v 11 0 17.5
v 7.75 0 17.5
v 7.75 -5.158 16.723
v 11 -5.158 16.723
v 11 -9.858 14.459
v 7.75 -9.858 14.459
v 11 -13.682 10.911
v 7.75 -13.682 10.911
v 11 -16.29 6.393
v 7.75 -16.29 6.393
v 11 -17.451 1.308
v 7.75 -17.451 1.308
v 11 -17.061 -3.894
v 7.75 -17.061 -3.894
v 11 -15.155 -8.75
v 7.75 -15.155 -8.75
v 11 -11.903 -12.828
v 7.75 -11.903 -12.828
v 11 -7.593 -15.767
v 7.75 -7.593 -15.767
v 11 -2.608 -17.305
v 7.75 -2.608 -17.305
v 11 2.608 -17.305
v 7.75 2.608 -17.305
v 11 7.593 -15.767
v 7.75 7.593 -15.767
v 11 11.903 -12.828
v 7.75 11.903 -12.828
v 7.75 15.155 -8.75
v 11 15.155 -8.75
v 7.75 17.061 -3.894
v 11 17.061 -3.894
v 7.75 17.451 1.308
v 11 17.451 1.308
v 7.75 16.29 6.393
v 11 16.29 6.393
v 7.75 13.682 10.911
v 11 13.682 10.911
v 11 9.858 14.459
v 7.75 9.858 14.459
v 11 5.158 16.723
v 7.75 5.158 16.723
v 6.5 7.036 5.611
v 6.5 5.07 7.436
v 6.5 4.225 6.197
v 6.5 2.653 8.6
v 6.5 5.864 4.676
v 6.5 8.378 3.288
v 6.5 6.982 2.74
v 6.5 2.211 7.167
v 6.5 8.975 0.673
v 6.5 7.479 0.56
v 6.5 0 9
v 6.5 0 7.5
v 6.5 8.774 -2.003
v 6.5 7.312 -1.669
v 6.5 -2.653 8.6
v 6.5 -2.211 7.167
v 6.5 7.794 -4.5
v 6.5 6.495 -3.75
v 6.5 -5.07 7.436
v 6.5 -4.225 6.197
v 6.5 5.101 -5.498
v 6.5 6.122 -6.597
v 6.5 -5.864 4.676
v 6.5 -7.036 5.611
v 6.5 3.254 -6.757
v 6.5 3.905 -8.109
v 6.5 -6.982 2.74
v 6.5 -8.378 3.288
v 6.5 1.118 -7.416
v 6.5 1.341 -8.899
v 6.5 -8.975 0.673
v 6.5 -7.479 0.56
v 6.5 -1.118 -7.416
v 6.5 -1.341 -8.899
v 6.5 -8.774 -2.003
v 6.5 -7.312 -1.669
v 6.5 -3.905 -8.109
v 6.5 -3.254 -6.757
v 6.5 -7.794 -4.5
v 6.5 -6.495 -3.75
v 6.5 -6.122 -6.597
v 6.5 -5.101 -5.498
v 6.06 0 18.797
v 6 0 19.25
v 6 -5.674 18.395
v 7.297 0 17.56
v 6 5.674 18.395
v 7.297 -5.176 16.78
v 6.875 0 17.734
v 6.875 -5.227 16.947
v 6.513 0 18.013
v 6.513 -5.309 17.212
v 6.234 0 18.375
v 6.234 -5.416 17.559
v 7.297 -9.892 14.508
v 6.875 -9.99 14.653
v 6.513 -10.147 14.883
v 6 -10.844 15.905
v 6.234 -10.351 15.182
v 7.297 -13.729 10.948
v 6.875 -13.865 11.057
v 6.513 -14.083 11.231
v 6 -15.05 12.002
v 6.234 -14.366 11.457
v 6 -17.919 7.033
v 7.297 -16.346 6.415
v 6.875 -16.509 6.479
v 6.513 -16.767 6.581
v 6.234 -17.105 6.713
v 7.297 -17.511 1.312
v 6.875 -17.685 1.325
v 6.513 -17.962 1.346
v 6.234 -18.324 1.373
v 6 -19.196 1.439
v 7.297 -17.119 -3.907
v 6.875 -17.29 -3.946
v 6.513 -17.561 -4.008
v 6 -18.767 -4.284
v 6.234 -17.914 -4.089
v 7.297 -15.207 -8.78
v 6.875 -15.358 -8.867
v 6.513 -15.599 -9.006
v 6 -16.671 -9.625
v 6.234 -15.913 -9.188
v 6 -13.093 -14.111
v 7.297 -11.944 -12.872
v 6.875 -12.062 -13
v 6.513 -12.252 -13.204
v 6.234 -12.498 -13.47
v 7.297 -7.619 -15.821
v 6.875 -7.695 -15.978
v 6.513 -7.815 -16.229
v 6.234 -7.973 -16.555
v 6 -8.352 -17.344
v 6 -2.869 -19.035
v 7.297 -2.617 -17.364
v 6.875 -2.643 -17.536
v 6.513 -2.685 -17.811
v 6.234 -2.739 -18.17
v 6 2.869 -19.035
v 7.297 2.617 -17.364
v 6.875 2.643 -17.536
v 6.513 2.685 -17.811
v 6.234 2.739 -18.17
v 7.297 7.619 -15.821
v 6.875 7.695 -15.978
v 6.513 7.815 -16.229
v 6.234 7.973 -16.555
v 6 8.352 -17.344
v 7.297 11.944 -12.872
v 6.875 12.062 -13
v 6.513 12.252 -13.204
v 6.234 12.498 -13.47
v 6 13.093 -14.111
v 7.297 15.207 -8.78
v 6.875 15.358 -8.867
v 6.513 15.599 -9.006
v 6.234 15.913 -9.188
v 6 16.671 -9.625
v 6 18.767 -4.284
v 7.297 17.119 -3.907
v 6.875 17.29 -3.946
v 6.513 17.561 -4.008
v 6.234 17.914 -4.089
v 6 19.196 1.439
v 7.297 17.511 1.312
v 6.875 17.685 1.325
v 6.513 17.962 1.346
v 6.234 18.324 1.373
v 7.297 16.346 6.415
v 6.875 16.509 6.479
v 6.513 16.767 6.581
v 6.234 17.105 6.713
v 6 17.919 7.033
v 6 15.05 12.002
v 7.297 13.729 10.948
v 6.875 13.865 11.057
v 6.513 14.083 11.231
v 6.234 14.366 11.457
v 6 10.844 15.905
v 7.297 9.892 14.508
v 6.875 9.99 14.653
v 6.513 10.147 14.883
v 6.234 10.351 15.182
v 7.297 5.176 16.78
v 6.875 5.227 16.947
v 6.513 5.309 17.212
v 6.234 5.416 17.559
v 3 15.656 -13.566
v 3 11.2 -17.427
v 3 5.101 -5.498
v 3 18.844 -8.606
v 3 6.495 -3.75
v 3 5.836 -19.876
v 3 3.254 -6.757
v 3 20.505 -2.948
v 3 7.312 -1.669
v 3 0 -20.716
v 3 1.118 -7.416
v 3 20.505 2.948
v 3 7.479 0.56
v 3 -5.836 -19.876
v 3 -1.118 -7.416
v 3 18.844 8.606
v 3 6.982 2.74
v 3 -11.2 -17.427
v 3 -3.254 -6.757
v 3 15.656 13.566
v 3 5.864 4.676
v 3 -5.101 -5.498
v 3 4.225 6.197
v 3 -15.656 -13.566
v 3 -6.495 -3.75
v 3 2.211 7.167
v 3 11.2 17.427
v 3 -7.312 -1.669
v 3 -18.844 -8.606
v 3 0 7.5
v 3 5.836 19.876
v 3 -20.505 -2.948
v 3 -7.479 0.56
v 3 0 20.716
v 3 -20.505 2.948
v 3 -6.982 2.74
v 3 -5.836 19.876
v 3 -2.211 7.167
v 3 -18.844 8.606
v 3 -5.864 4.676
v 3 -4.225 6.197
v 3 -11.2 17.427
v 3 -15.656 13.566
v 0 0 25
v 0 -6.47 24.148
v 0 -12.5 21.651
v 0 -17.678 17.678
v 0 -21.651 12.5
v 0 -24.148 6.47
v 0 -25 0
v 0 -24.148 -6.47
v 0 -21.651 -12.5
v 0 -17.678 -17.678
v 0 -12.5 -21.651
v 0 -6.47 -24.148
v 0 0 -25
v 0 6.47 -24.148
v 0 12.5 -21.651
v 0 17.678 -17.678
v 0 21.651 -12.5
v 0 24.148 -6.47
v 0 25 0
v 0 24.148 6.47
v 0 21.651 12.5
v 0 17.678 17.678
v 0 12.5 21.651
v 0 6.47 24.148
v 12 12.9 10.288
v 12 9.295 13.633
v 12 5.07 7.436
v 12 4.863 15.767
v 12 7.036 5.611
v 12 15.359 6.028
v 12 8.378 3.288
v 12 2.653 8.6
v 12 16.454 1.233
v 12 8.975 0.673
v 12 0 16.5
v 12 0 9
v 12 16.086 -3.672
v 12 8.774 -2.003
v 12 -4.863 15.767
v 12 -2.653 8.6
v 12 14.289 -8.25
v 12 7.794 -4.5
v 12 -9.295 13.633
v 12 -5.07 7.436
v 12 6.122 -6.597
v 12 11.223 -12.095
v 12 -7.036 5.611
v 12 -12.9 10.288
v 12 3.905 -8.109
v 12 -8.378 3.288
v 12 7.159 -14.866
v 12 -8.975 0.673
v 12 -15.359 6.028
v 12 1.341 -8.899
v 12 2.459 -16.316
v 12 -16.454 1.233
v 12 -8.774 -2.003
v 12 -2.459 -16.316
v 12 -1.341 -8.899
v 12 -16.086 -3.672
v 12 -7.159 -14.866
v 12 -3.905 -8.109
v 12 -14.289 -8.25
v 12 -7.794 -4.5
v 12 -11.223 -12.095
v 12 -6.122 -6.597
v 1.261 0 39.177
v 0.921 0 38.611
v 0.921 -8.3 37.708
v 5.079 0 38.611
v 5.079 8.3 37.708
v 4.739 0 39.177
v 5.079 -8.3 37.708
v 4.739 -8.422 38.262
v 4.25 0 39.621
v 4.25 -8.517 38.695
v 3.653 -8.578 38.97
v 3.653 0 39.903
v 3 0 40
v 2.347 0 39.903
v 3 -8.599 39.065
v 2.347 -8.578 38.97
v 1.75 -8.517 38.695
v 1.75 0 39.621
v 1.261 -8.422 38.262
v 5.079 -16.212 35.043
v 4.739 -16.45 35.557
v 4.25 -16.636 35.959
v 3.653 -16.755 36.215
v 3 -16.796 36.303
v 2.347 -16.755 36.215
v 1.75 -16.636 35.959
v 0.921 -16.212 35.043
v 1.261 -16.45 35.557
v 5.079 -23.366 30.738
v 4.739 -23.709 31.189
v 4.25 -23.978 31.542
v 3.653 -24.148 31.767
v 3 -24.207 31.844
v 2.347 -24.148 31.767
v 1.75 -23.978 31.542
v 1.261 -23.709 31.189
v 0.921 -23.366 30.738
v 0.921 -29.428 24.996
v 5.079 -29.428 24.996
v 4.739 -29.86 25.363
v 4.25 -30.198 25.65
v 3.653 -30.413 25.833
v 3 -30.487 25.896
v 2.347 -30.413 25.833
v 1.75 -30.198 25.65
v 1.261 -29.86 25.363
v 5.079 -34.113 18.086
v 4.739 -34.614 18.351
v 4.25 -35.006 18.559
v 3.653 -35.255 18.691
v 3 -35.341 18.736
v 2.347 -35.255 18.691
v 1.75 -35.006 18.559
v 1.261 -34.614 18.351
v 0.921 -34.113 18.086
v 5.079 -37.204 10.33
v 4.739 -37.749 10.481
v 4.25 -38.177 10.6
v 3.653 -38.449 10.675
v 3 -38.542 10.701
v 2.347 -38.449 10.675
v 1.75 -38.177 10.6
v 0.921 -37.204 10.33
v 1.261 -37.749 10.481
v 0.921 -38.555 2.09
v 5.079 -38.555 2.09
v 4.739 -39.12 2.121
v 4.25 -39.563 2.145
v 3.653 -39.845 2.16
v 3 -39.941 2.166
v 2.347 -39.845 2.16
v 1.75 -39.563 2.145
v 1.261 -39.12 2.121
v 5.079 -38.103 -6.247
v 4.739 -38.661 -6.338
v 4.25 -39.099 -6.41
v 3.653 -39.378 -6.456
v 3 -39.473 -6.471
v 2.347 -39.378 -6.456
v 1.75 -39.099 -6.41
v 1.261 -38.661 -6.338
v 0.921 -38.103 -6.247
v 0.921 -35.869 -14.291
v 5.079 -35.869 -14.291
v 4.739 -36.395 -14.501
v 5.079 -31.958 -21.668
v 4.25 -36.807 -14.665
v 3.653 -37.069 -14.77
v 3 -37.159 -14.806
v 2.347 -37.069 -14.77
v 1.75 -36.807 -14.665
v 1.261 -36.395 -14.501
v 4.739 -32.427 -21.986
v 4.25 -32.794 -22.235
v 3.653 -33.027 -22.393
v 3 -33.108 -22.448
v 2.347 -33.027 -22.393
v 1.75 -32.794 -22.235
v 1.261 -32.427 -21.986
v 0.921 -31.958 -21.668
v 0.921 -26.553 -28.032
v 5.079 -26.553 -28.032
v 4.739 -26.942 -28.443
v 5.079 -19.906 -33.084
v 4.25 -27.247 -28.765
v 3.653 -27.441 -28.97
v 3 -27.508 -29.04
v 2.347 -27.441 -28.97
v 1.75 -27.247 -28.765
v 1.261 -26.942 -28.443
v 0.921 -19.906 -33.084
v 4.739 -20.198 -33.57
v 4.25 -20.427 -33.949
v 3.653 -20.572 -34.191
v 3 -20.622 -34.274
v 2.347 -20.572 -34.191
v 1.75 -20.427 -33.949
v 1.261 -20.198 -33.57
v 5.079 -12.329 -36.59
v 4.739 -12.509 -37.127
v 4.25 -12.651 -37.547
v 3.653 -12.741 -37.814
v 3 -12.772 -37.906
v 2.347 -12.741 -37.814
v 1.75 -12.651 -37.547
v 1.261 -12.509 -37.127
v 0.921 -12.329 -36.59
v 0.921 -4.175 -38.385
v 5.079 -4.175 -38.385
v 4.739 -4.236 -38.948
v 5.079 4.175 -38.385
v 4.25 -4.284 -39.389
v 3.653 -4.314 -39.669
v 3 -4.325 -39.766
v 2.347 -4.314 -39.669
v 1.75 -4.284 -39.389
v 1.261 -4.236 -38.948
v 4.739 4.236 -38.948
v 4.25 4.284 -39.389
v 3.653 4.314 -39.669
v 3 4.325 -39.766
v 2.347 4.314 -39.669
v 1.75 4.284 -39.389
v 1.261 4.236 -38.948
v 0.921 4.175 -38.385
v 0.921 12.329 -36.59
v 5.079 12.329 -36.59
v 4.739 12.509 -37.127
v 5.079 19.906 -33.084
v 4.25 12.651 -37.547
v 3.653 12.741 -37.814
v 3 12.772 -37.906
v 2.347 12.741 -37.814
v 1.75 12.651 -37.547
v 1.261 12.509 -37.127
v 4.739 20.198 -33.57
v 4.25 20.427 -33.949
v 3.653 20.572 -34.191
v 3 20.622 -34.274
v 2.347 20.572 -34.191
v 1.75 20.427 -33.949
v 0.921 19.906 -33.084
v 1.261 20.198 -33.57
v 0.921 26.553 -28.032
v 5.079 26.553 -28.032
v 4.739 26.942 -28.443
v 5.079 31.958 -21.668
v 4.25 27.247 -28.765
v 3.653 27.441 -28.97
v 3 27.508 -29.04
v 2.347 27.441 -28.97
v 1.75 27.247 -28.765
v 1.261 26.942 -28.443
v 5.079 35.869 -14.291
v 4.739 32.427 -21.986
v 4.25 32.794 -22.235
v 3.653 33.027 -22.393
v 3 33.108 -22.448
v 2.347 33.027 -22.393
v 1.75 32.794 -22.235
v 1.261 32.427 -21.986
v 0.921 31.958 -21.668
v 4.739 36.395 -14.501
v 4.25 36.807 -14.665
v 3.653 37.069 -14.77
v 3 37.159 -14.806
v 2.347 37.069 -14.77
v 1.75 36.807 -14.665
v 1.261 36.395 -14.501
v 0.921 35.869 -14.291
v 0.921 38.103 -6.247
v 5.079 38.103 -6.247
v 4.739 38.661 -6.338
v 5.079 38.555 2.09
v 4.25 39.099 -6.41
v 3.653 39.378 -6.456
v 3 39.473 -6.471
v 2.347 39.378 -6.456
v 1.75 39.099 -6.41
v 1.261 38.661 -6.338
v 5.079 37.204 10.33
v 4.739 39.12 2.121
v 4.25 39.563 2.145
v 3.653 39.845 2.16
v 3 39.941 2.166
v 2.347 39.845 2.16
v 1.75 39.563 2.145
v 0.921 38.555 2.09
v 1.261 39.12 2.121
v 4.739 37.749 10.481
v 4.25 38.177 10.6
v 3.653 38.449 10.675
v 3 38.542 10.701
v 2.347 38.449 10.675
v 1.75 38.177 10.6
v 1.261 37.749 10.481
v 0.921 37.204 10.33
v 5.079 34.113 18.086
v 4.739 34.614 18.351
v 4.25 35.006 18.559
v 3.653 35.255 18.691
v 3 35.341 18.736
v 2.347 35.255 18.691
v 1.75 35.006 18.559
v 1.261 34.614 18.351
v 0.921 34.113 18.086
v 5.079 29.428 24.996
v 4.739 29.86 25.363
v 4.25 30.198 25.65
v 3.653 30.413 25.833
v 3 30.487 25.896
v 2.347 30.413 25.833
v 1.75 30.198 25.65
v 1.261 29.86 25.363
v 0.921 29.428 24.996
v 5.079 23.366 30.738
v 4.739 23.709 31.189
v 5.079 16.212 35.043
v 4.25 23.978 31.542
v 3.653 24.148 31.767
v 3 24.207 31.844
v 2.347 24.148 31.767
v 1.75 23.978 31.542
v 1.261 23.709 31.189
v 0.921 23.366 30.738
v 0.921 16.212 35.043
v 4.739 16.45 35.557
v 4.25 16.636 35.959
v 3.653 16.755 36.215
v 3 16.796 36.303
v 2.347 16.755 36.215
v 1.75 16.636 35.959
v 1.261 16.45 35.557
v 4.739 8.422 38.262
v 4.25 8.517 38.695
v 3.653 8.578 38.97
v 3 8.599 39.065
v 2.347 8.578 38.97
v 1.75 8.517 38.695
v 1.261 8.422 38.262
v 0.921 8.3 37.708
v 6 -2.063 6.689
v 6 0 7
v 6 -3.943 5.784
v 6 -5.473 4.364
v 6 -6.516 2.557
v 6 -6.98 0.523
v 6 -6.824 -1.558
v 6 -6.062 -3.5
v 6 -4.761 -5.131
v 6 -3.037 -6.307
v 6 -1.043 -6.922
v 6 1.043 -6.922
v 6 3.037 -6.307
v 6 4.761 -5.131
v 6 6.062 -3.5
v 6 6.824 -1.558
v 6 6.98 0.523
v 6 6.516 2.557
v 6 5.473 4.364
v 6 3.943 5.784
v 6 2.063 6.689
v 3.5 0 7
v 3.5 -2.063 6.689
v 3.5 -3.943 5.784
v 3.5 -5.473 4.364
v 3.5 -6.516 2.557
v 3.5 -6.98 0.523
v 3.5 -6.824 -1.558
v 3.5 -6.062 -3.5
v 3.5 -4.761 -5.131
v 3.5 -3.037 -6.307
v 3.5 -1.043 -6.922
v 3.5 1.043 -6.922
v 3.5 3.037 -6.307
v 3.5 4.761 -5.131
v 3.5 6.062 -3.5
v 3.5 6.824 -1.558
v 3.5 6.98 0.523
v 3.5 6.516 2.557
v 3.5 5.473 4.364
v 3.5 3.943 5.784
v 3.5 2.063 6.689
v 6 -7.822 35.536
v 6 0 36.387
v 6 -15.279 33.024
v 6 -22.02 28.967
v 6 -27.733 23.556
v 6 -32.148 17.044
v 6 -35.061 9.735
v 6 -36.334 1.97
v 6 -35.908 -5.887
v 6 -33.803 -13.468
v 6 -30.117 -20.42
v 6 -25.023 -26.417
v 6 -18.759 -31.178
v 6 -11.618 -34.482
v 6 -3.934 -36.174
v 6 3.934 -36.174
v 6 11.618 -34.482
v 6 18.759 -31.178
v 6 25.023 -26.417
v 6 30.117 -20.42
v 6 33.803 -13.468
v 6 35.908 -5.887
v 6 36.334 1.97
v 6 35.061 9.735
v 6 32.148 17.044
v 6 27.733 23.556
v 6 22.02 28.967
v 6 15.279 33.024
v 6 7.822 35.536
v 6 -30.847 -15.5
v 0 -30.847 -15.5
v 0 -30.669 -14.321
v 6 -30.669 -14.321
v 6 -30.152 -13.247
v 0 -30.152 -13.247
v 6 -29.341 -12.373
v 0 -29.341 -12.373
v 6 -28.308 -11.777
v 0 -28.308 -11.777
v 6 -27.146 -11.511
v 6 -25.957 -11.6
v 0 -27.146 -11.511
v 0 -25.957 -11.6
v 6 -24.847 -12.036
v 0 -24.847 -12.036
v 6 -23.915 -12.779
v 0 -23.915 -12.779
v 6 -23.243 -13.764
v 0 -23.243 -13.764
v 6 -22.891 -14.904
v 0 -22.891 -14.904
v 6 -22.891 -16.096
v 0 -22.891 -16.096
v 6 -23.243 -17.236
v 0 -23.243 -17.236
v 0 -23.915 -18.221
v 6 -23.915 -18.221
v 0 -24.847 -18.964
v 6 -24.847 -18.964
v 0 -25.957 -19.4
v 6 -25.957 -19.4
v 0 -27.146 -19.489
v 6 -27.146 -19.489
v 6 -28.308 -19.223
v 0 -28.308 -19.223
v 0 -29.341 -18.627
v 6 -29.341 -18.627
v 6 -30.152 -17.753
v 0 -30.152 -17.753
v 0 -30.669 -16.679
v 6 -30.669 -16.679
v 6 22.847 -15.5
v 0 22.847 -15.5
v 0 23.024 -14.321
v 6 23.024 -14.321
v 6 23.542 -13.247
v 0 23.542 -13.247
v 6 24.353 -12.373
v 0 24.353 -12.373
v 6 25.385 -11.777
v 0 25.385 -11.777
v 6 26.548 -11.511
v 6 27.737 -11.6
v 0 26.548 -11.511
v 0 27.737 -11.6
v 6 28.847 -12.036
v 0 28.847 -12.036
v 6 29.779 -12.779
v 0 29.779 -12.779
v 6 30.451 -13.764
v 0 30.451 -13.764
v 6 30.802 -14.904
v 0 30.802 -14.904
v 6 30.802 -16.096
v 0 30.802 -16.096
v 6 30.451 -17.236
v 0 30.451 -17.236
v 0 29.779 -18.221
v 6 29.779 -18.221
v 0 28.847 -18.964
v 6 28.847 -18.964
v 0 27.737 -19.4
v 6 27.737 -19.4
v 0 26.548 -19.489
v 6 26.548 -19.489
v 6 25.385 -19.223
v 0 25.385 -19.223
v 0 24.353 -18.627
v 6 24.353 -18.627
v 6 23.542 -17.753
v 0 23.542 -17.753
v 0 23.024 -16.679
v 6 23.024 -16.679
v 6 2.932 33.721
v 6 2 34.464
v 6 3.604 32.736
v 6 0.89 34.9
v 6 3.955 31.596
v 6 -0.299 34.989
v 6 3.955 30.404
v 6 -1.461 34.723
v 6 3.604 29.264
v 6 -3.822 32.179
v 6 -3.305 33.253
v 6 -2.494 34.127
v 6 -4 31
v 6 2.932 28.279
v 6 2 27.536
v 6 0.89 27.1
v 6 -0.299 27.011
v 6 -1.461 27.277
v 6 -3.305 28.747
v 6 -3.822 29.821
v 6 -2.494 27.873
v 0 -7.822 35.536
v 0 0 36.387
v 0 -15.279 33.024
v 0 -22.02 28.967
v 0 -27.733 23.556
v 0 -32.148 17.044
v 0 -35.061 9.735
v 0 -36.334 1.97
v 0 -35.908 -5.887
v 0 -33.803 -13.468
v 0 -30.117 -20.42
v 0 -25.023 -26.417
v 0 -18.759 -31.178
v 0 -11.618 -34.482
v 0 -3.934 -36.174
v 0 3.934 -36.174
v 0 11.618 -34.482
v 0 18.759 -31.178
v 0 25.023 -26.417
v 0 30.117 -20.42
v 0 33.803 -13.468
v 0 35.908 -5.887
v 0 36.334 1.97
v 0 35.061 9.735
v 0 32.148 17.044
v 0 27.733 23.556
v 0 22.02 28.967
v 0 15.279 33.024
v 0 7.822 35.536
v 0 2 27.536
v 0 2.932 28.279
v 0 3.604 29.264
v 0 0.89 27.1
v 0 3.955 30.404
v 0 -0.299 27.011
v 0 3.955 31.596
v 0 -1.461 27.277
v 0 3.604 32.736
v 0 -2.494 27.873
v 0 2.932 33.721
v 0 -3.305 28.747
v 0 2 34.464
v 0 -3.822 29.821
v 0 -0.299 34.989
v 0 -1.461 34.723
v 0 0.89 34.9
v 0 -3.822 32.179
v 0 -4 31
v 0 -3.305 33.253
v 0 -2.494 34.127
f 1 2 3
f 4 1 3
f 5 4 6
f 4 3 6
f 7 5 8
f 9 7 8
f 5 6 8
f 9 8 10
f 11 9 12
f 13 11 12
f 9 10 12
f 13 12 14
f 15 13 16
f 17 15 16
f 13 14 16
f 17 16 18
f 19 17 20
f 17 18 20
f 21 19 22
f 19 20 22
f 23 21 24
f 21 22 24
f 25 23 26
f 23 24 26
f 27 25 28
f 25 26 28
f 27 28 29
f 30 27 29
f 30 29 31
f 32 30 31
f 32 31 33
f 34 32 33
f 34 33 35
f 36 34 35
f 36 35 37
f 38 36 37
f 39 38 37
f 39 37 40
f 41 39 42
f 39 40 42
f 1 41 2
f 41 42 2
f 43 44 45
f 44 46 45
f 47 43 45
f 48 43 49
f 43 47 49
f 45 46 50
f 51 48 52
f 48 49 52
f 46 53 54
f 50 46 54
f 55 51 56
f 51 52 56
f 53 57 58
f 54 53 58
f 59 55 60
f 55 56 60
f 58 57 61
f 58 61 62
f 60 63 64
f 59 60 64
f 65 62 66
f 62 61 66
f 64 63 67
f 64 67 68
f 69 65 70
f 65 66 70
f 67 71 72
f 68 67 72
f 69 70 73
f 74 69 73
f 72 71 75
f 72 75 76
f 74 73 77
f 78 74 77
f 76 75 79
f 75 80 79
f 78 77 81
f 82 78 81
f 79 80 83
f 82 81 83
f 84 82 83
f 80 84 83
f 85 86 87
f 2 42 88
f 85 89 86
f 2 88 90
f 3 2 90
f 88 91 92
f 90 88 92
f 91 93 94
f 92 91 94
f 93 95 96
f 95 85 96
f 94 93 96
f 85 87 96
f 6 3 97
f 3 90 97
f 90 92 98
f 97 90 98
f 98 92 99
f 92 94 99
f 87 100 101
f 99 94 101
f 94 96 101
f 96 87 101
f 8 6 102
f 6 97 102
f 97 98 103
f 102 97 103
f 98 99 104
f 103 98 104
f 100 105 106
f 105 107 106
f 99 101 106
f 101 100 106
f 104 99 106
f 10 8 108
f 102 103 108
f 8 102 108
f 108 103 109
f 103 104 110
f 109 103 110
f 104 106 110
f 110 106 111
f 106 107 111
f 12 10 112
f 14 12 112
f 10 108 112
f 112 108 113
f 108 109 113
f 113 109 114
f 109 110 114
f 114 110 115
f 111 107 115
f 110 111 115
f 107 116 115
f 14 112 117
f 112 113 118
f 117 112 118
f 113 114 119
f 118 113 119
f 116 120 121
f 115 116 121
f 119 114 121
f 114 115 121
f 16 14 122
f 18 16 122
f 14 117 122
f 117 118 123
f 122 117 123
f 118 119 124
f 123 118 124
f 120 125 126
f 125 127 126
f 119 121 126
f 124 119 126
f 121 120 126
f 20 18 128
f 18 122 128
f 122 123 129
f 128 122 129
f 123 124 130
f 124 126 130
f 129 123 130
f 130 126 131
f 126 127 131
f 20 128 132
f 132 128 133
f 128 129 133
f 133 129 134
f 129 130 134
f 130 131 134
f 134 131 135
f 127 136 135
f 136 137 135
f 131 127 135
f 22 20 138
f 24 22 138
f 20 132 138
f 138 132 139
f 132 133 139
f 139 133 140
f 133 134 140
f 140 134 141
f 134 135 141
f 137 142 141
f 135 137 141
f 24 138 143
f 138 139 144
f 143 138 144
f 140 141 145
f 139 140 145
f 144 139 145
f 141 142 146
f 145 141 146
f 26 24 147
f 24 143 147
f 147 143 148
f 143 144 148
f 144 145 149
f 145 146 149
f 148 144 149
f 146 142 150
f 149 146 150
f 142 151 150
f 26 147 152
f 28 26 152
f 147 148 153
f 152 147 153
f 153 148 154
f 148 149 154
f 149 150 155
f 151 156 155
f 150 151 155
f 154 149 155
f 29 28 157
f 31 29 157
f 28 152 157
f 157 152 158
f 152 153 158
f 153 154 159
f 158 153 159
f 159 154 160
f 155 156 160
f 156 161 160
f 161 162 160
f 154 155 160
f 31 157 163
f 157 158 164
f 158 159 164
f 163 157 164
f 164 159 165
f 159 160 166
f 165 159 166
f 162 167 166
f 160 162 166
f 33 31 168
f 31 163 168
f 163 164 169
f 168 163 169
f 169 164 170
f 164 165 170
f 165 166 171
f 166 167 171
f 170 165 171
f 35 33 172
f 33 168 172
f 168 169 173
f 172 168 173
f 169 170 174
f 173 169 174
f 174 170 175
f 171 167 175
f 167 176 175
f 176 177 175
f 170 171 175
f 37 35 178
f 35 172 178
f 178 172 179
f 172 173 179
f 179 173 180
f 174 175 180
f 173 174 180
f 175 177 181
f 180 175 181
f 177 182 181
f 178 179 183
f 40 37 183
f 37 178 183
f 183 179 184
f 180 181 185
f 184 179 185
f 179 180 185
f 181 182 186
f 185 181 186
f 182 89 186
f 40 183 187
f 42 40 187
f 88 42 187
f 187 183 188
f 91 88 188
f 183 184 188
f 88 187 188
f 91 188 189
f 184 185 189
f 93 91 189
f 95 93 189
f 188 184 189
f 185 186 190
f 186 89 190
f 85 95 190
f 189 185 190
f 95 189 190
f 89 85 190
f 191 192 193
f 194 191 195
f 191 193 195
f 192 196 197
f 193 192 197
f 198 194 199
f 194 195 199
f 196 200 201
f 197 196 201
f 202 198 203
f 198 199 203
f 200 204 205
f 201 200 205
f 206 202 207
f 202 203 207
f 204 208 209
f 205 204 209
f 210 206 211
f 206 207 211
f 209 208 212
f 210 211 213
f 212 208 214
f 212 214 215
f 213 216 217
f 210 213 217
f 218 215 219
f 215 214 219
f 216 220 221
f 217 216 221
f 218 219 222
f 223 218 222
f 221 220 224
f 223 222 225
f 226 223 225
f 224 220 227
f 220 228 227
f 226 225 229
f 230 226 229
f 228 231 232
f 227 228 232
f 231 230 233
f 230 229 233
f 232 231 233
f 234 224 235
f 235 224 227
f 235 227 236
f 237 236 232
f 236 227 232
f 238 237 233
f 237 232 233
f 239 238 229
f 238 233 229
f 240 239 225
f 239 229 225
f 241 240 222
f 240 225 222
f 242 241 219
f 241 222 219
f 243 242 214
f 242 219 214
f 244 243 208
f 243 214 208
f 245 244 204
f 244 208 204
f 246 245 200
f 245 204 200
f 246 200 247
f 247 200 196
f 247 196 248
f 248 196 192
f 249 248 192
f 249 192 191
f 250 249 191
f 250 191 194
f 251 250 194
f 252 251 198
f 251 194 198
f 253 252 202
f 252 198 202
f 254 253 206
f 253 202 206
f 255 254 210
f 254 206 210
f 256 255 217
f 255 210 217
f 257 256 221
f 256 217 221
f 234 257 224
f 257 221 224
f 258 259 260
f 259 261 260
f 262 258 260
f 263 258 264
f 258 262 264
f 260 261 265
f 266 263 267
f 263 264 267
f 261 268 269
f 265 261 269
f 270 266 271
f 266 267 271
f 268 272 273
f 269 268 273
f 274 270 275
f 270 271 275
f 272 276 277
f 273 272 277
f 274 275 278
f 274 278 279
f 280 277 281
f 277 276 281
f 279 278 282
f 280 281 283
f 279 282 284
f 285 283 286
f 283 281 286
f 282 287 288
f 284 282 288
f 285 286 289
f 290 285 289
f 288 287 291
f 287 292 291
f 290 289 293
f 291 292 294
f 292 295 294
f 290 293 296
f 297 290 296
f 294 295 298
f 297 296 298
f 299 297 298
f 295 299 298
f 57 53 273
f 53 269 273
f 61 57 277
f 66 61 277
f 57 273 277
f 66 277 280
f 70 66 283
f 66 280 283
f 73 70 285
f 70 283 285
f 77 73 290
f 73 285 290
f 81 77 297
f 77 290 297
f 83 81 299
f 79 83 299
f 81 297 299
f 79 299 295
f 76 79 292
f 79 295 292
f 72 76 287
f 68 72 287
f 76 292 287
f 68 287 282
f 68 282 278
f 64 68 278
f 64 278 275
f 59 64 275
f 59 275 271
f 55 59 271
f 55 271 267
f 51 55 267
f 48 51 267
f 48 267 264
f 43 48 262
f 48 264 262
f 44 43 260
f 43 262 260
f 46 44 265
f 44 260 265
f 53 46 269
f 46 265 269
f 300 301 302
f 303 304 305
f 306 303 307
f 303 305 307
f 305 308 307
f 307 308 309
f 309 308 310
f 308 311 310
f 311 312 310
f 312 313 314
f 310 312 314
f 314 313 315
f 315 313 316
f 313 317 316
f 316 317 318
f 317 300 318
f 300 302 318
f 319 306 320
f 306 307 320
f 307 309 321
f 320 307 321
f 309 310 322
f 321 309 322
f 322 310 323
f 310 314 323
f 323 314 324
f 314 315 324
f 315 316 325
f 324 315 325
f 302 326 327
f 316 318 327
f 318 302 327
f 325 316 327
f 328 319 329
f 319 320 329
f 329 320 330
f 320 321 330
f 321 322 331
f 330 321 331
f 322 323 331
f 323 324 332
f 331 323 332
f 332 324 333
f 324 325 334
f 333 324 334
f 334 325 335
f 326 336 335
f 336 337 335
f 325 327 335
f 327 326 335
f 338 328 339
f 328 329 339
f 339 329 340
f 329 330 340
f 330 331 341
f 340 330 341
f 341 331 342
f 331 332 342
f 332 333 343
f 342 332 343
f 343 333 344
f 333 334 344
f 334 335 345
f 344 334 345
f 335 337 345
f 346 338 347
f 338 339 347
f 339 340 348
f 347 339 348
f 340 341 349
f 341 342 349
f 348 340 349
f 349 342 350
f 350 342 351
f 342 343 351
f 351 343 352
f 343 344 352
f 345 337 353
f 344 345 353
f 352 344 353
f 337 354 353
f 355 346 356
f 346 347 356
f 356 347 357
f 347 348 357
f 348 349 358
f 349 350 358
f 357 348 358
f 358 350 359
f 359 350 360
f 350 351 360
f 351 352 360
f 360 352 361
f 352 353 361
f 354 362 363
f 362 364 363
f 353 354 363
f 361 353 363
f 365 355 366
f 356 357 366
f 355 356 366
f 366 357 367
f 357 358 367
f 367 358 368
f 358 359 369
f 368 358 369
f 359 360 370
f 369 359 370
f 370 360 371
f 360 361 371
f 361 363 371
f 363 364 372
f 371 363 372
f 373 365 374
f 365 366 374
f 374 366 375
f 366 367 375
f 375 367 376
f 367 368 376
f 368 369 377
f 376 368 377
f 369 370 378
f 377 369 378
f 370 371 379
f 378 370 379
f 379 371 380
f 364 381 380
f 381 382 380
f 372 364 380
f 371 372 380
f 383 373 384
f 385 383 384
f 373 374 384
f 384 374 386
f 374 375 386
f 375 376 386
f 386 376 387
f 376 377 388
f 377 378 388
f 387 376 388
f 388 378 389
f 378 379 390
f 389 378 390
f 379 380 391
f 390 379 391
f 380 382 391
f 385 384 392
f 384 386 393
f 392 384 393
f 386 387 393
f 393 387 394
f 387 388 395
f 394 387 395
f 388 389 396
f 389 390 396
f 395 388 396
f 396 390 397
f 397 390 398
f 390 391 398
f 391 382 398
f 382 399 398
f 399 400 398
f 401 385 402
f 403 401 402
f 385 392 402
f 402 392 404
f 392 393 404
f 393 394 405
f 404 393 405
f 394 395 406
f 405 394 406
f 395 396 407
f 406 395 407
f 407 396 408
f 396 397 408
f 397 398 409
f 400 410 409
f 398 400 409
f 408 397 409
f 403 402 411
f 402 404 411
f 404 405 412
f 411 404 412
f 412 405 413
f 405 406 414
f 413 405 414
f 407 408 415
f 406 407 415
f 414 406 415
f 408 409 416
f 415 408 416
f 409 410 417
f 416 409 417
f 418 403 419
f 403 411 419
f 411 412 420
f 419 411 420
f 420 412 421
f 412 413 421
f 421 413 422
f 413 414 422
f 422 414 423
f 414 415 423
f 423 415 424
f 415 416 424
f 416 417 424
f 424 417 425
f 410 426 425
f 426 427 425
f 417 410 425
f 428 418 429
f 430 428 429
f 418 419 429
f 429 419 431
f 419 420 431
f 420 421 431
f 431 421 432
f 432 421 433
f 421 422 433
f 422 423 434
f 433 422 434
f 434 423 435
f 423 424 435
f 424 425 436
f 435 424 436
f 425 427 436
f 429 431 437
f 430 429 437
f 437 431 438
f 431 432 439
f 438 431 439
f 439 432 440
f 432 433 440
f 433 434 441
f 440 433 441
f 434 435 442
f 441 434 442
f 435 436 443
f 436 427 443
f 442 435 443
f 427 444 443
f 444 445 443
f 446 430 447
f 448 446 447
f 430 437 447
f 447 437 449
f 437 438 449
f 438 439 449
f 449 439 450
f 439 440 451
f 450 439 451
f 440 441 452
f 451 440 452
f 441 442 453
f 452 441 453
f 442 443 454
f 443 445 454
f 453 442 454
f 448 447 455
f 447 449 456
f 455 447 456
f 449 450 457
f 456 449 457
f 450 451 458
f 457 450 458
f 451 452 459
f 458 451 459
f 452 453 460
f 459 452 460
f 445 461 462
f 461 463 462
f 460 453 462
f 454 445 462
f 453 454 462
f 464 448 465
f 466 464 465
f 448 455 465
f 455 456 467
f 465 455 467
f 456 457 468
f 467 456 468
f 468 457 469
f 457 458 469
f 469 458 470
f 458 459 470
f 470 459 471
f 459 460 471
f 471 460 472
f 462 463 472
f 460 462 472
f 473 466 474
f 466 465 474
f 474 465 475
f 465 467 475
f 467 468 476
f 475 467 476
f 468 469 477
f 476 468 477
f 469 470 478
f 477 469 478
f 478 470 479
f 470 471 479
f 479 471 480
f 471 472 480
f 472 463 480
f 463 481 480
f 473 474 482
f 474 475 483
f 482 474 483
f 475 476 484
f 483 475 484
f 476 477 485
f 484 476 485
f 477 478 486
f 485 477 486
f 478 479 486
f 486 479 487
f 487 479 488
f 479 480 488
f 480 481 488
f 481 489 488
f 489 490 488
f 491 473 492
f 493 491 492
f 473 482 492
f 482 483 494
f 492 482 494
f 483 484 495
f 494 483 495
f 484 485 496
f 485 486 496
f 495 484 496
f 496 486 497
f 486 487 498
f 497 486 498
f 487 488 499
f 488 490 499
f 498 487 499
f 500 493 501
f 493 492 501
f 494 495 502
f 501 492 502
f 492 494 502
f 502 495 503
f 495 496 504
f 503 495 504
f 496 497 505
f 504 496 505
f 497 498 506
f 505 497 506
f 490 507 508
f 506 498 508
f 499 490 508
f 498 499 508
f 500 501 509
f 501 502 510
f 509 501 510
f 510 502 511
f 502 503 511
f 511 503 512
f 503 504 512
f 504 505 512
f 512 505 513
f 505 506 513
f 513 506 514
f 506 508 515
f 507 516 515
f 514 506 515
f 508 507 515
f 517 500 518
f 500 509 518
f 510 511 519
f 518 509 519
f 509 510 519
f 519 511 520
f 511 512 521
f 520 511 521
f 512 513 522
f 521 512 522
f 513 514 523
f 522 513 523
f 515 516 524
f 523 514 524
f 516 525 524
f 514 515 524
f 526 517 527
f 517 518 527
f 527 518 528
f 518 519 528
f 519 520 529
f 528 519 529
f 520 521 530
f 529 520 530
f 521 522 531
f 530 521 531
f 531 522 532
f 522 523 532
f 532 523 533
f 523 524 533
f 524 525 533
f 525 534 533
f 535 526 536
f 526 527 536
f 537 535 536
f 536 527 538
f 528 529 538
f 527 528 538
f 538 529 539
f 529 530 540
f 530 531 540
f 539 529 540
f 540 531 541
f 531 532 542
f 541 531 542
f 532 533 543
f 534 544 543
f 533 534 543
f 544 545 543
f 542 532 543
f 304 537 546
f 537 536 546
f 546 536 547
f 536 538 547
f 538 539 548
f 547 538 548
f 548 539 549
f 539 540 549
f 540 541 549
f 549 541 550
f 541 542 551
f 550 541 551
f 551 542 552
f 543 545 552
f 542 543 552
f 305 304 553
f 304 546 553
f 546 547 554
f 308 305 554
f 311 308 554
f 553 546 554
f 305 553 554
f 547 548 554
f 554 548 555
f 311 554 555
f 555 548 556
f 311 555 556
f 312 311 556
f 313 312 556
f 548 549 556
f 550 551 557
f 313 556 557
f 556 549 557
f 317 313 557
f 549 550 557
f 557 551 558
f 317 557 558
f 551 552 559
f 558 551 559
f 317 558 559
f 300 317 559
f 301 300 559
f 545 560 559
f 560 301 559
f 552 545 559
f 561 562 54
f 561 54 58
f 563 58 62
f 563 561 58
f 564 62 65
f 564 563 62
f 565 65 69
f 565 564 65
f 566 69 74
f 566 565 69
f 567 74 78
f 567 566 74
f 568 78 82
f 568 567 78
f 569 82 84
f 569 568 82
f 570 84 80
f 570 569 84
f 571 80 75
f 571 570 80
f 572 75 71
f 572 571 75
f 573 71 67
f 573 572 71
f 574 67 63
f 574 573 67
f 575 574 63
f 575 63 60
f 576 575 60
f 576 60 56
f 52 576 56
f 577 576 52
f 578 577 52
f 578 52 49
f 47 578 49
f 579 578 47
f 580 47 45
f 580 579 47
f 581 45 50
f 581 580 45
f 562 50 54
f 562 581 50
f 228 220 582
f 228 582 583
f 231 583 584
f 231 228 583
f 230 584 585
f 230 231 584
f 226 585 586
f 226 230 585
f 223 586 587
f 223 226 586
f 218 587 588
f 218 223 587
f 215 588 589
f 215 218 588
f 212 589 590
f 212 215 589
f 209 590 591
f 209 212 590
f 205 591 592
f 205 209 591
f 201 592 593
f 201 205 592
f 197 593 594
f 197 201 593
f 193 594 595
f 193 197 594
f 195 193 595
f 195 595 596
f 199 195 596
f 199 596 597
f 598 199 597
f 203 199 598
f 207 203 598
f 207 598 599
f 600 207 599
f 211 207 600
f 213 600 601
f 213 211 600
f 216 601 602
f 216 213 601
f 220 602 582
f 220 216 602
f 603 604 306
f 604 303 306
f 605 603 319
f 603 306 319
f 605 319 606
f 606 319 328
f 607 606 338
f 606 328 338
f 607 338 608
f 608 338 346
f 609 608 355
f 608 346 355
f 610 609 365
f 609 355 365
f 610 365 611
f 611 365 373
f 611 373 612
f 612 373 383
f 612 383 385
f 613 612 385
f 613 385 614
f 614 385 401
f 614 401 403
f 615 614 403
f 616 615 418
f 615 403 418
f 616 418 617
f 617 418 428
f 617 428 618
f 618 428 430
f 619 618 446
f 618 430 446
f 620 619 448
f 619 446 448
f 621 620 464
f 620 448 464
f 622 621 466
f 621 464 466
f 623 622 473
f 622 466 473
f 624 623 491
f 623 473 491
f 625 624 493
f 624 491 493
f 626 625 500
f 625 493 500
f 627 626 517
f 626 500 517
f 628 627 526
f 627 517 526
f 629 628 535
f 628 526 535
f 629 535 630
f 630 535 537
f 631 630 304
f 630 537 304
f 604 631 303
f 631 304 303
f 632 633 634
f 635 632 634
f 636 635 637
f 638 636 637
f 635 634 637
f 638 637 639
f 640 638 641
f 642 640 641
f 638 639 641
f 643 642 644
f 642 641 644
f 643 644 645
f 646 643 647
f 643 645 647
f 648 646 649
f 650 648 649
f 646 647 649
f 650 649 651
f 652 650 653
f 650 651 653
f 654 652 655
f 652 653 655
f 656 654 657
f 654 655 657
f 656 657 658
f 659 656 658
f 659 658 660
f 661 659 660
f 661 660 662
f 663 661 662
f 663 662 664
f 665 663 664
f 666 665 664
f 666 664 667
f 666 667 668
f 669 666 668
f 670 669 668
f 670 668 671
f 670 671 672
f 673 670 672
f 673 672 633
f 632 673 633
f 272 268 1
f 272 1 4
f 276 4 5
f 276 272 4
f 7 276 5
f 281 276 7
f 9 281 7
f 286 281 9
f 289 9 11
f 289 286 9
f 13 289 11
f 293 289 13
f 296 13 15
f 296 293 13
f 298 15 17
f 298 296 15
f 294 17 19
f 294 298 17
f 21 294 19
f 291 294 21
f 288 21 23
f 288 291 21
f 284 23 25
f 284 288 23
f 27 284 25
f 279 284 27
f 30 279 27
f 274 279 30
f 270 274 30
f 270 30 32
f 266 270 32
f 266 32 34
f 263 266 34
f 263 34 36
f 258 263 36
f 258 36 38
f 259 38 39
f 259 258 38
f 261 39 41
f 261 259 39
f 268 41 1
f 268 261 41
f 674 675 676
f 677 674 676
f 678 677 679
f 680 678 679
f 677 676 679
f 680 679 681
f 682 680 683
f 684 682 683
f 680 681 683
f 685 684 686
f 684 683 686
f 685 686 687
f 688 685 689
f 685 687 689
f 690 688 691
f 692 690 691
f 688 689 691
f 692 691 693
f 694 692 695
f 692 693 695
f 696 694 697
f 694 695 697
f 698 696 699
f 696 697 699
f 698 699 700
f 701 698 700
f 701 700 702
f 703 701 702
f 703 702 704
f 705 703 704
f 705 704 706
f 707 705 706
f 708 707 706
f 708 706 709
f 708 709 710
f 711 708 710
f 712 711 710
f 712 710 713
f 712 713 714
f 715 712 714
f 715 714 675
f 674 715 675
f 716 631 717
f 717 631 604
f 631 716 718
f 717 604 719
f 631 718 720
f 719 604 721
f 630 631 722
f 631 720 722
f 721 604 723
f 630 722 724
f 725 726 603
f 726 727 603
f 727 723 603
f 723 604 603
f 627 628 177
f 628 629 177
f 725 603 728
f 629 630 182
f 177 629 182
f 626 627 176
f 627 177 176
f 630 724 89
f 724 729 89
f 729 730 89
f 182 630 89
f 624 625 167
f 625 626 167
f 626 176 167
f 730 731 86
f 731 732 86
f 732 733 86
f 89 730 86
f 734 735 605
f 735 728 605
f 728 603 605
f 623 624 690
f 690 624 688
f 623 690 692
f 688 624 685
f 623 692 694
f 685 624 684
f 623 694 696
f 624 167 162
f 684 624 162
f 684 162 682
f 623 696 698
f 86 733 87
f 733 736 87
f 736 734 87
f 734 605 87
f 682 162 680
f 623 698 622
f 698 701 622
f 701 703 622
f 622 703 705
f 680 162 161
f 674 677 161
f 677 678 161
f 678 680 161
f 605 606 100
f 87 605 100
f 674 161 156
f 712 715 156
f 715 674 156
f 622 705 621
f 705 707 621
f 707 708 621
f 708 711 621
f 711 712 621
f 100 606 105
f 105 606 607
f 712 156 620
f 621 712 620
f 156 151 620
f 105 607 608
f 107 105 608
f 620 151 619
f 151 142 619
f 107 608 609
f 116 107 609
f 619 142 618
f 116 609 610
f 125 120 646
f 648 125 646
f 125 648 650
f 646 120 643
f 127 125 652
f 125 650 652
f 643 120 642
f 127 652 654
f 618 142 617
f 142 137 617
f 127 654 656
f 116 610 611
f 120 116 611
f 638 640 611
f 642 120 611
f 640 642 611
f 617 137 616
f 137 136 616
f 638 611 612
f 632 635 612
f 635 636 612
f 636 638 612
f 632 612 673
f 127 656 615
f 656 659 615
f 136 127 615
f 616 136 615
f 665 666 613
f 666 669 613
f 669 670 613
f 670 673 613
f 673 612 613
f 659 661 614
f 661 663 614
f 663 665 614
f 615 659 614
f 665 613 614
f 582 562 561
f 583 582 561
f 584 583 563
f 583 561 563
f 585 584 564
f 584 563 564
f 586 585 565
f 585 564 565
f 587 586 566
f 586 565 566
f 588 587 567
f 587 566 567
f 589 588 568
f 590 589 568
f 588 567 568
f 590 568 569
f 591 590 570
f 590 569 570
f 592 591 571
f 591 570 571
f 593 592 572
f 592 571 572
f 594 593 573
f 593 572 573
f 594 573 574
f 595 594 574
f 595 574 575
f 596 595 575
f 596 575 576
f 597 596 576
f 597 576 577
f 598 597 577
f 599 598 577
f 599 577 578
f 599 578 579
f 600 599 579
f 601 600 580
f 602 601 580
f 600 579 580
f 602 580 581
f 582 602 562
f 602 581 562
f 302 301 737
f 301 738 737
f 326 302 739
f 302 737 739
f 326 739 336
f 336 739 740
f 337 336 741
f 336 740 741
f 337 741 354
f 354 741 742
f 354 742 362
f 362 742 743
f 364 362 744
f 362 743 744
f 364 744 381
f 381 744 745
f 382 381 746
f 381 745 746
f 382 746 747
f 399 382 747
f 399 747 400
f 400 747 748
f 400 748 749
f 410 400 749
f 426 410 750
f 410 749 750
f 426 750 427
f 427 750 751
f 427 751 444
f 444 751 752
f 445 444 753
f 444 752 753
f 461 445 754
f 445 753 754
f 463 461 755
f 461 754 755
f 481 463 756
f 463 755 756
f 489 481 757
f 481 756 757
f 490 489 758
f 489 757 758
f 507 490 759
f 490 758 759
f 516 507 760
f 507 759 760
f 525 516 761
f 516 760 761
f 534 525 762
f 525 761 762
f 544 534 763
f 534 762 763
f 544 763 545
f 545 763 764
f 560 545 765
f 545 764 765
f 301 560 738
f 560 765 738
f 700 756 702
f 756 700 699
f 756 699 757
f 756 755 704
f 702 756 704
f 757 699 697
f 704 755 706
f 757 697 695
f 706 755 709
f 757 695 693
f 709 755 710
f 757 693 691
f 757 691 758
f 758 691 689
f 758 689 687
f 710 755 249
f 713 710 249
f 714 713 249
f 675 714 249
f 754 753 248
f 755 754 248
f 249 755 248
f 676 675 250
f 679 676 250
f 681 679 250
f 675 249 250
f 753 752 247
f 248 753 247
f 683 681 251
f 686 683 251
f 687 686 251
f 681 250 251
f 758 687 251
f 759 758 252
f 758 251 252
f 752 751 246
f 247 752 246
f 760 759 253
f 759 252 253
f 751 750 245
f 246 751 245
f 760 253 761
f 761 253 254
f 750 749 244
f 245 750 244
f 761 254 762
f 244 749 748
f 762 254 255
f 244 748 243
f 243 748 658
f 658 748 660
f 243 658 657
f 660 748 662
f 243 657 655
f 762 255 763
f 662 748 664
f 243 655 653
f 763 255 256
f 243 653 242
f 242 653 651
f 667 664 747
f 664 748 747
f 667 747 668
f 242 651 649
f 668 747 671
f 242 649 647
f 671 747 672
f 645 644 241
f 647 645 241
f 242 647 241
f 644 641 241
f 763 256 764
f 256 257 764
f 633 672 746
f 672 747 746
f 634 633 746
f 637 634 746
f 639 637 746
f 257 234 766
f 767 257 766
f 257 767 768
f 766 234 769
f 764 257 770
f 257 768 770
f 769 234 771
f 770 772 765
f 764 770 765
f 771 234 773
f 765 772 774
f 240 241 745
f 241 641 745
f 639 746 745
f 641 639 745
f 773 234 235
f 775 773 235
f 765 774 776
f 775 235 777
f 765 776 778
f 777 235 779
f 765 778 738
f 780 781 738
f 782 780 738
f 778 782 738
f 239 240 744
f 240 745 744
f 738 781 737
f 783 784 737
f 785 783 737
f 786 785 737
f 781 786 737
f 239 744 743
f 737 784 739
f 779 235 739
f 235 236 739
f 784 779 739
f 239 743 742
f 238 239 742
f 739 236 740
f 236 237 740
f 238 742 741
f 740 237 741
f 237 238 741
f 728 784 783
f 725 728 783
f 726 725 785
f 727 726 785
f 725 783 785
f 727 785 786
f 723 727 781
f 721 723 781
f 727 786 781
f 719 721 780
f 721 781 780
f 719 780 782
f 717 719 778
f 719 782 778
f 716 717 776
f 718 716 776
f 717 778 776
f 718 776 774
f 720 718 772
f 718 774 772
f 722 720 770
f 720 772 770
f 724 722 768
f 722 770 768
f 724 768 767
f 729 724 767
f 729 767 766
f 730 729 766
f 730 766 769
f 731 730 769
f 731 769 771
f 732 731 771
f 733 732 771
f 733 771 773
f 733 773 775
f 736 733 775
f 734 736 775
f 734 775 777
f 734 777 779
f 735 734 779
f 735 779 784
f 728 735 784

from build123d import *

# Parameters (mm, degrees)
F2_R     = 1.75
F3_SIZE  = 1
F4_R     = 4
F5_DEPTH = 25
F6_SIZE  = 0.5
F7_SIZE  = 0.5


with BuildPart() as f1:
    # F0 (on Front) → F1 (revolve)
    with BuildSketch(Plane.XZ):
        with BuildLine():
            Line((0, 36.387), (0, 25))
            Line((0, 25), (3, 20.715556))
            Line((3, 20.715556), (3, 7))
            Line((3, 7), (6.5, 7))
            Line((6.5, 7), (6.5, 9))
            Line((6.5, 9), (12, 9))
            Line((12, 9), (12, 17.5))
            Line((12, 17.5), (6, 17.5))
            Line((6, 17.5), (6, 36.387))
            Line((6, 36.387), (5.078729, 38.611145))
            ThreePointArc((5.078729, 38.611145), (3, 40.000107), (0.921271, 38.611145))
            Line((0.921271, 38.611145), (0, 36.387))
        make_face()
    revolve(axis=Axis((11.340396, 0, 0), (1, 0, 0)))

    # F2
    f2_edges = [f1.edges().sort_by_distance(p)[0] for p in [
        (6, 0, -17.5),
    ]]
    fillet(f2_edges, radius=F2_R)

    # F3
    f3_edges = [f1.edges().sort_by_distance(p)[0] for p in [
        (12, 0, -17.5),
    ]]
    chamfer(f3_edges, length=F3_SIZE)

    # F4 (on face) → F5 (cut)
    with BuildSketch(Plane(origin=(0, 0, 0), x_dir=(0, -1, 0), z_dir=(-1, 0, 0))):
        with Locations((0, 31)):
            Circle(F4_R)
        with Locations((-26.846788, -15.5)):
            Circle(F4_R)
        with Locations((26.846788, -15.5)):
            Circle(F4_R)
    extrude(amount=-F5_DEPTH, mode=Mode.SUBTRACT)

    # F6
    f6_edges = [f1.edges().sort_by_distance(p)[0] for p in [
        (6.5, 0, -7),
    ]]
    chamfer(f6_edges, length=F6_SIZE)

    # F7
    f7_edges = [f1.edges().sort_by_distance(p)[0] for p in [
        (3, 0, -7),
    ]]
    chamfer(f7_edges, length=F7_SIZE)


solid = f1.part
